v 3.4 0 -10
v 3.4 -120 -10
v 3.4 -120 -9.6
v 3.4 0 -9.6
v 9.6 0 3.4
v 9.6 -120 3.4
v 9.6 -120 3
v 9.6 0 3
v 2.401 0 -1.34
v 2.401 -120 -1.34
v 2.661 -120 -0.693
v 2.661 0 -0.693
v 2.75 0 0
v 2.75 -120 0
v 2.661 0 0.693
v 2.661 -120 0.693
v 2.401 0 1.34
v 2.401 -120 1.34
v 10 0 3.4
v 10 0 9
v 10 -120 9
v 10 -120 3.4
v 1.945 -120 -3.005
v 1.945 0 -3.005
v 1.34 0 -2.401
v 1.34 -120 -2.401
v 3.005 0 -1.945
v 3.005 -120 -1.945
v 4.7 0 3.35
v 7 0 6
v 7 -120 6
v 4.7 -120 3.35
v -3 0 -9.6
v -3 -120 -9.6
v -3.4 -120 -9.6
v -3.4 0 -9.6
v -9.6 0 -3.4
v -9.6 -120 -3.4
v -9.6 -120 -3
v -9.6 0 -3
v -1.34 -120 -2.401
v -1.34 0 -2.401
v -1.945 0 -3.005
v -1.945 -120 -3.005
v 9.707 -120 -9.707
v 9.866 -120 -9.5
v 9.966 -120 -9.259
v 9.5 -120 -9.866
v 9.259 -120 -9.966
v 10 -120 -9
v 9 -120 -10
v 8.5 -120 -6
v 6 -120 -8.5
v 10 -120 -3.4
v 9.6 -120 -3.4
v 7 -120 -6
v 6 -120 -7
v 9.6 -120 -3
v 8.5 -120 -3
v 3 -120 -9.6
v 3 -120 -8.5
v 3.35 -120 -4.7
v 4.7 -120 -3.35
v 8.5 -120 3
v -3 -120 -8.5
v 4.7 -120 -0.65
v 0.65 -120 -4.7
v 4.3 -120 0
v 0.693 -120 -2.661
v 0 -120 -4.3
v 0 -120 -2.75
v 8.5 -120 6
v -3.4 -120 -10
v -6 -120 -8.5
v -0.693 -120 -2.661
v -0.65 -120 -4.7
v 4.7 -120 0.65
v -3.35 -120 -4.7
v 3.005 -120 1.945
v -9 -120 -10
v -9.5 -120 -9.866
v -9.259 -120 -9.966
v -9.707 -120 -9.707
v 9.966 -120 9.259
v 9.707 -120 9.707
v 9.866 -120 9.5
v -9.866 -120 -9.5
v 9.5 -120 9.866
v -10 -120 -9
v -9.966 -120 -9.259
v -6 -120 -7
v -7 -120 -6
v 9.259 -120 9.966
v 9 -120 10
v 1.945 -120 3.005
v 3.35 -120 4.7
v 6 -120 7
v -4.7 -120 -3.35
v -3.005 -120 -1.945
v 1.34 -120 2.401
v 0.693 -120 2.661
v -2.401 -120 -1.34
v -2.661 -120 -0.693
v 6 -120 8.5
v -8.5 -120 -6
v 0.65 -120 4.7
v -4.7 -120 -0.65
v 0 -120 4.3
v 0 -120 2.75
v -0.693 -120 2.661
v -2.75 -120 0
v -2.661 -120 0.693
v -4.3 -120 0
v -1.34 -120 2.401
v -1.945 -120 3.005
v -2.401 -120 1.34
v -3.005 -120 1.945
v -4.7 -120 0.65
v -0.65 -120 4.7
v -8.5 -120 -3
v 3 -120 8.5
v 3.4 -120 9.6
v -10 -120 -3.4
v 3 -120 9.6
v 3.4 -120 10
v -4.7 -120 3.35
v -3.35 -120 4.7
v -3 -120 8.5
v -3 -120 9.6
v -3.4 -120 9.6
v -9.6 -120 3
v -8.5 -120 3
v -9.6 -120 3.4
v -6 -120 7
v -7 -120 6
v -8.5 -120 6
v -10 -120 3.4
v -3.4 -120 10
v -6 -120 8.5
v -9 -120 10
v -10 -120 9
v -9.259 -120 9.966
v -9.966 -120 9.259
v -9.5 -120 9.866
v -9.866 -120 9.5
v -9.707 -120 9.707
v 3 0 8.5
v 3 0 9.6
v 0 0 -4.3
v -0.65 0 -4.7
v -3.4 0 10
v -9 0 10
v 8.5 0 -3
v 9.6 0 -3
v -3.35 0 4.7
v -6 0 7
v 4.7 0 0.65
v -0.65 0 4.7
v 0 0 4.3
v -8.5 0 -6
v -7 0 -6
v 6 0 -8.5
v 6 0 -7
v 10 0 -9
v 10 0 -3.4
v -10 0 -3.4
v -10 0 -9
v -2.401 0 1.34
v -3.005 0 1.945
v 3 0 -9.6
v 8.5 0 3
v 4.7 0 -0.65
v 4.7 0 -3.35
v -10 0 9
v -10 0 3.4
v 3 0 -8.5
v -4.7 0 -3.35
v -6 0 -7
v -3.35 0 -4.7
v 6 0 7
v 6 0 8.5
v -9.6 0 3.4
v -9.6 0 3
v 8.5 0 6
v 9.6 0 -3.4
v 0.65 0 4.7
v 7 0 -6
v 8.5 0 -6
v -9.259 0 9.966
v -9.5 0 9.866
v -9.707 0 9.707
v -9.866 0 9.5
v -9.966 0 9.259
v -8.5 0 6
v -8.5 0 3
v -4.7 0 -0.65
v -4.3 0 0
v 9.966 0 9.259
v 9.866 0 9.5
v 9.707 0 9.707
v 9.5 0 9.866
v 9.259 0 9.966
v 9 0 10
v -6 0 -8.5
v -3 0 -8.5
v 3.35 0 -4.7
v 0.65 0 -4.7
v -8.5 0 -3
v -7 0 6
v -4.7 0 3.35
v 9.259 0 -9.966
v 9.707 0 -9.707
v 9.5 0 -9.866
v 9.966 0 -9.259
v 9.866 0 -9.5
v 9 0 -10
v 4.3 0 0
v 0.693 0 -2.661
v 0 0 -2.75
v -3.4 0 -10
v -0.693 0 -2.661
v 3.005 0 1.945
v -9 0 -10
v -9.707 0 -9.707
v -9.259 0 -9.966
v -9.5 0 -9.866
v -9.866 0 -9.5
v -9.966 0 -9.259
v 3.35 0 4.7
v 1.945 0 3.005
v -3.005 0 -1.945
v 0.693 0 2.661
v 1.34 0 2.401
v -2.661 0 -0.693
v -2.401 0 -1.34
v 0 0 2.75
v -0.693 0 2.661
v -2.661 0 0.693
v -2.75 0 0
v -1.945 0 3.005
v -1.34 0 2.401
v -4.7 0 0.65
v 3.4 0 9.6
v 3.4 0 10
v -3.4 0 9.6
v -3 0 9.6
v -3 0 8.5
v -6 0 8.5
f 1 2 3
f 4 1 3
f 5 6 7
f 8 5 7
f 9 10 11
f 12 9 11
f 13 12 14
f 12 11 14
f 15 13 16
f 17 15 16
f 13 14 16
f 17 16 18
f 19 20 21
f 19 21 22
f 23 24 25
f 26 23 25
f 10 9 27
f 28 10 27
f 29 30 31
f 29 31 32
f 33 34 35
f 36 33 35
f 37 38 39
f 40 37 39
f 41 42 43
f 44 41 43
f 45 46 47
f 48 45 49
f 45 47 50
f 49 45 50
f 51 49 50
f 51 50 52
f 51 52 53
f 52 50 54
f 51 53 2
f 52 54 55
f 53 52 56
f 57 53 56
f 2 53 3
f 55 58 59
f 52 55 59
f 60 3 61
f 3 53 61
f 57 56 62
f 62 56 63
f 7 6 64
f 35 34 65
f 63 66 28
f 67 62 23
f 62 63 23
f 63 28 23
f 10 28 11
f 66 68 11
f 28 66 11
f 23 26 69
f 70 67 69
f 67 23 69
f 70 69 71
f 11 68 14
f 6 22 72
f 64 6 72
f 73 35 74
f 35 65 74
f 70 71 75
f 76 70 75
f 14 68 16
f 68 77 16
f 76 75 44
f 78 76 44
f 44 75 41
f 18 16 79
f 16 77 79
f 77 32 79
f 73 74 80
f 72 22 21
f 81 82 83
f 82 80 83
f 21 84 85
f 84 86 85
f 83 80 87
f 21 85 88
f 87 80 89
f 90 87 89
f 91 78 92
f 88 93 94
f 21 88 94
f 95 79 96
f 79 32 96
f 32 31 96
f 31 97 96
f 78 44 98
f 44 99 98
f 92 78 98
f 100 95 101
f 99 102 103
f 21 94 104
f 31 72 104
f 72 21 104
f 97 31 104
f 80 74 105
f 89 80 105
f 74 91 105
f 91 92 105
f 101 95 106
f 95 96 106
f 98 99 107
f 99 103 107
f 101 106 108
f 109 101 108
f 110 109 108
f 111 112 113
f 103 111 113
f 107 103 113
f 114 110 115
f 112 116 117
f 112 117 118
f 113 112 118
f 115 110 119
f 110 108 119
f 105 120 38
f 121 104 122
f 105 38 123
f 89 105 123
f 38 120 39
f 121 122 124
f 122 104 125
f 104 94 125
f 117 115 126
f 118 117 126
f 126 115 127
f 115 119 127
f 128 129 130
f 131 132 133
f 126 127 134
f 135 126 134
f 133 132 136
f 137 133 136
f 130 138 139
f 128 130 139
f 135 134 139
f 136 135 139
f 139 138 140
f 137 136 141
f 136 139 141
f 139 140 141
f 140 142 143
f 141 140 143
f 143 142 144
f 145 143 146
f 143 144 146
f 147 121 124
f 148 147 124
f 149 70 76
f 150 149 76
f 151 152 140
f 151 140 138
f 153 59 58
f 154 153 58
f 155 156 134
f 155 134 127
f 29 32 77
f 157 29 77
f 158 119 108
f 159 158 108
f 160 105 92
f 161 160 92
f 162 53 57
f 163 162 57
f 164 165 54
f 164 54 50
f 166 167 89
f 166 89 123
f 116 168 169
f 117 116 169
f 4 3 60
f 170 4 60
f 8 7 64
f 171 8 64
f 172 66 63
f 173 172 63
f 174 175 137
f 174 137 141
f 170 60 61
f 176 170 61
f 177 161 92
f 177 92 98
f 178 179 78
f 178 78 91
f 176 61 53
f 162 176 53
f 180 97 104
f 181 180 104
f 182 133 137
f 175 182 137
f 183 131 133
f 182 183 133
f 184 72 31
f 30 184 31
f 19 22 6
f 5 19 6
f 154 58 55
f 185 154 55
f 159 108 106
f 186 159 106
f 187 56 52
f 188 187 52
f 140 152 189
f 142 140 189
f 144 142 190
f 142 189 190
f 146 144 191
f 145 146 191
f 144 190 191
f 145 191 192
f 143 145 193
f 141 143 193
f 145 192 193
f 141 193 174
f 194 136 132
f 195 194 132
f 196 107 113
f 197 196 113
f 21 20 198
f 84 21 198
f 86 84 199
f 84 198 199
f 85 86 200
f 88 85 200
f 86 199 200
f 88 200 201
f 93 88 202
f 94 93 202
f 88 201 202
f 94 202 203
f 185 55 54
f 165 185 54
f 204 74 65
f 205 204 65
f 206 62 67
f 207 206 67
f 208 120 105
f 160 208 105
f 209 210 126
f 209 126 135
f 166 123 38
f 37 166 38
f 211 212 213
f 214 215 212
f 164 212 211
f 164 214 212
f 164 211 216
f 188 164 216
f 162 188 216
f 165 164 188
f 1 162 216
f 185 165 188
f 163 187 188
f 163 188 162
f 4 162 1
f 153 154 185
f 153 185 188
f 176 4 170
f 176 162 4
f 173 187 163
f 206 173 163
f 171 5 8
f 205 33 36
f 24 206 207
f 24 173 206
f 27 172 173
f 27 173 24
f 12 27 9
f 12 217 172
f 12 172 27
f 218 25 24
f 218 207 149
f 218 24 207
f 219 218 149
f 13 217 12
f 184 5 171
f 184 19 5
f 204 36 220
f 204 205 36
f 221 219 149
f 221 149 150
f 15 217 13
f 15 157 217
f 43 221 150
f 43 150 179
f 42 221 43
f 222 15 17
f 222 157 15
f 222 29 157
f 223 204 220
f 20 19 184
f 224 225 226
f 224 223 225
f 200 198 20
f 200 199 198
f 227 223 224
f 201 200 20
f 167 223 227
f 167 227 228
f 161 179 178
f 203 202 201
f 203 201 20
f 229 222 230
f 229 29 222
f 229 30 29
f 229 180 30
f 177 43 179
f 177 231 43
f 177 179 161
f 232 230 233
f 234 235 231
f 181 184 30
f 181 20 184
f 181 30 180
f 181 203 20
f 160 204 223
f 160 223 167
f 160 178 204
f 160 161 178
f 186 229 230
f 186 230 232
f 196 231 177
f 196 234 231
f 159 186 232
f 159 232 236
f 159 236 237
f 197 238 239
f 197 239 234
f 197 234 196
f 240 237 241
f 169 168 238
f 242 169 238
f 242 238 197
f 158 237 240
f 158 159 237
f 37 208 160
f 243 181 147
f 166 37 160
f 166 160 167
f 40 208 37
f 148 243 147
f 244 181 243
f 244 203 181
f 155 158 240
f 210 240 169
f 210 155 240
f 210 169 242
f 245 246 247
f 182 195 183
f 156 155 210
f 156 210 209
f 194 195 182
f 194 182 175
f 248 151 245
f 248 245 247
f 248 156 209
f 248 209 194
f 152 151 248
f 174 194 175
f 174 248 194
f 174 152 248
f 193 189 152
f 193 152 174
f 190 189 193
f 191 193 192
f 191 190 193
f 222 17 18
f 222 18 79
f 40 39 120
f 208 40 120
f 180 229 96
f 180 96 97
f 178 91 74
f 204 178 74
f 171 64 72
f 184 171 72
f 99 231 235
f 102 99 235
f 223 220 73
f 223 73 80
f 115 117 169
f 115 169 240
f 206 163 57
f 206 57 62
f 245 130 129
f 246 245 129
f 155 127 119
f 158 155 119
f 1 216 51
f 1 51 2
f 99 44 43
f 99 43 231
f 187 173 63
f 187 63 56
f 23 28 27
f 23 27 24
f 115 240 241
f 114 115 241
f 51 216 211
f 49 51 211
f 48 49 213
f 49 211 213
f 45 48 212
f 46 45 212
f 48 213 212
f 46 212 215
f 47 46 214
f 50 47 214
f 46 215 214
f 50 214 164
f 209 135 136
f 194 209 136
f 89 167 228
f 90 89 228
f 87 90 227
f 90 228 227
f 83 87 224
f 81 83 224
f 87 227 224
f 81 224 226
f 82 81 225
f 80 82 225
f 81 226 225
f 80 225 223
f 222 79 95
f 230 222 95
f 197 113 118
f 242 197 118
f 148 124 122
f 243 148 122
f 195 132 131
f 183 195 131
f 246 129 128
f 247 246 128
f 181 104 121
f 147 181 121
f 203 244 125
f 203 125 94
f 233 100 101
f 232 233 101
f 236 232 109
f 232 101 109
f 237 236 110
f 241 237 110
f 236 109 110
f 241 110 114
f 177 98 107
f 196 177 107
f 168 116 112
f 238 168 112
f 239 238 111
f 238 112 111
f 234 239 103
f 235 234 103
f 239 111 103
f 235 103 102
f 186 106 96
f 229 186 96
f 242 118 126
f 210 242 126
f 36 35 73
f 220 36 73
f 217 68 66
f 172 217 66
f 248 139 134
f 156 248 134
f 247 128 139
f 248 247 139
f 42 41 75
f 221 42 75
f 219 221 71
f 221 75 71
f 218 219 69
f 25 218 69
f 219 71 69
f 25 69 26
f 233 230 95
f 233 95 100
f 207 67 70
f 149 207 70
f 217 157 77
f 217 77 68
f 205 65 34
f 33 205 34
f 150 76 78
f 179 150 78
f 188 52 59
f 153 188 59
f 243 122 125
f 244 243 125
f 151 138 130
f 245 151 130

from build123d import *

# Parameters (mm, degrees)
PAD_DEPTH          = 120
POCKET_DEPTH       = 380
POLARPATTERN_COUNT = 4
POCKET001_DEPTH    = 380


with BuildPart() as part:
    # Sketch → Pad (new body)
    with BuildSketch(Plane.XZ):
        with BuildLine():
            Line((-9, 10), (9, 10))
            ThreePointArc((10, 9), (9.707107, 9.707107), (9, 10))
            Line((10, 9), (10, -9))
            ThreePointArc((9, -10), (9.707107, -9.707107), (10, -9))
            Line((9, -10), (-9, -10))
            ThreePointArc((-10, -9), (-9.707107, -9.707107), (-9, -10))
            Line((-10, -9), (-10, 9))
            ThreePointArc((-9, 10), (-9.707107, 9.707107), (-10, 9))
        make_face()
    extrude(amount=PAD_DEPTH)

    # Sketch001 (on Face10 of Pad) → Pocket (cut)
    with BuildSketch(Plane.XZ.offset(120)):
        Polygon((-3.4, 10), (-3.4, 9.6), (-3, 9.6), (-3, 8.5), (-6, 8.5), (-6, 7), (-3.35, 4.7), (-0.65, 4.7), (0, 4.3), (0.65, 4.7), (3.35, 4.7), (6, 7), (6, 8.5), (3, 8.5), (3, 9.6), (3.4, 9.6), (3.4, 10), align=None)
    pocket = extrude(amount=-POCKET_DEPTH, mode=Mode.SUBTRACT)

    # PolarPattern: Pocket ×4 about axis
    polarpattern_axis = Axis((0, -120, 0), (0, -1, 0))
    for i in range(1, POLARPATTERN_COUNT):
        add(pocket.rotate(polarpattern_axis, i * 360 / POLARPATTERN_COUNT), mode=Mode.SUBTRACT)

    # Sketch002 (on Face4 of PolarPattern) → Pocket001 (cut)
    with BuildSketch(Plane.XZ.offset(120)):
        with BuildLine():
            ThreePointArc((1.340499, 2.401159), (0, 2.75), (-1.340499, 2.401159))
            Line((-1.944544, 3.005204), (-1.340499, 2.401159))
            Line((-3.005204, 1.944544), (-1.944544, 3.005204))
            Line((-2.401159, 1.340499), (-3.005204, 1.944544))
            ThreePointArc((-2.401159, 1.340499), (-2.75, 0), (-2.401159, -1.340499))
            Line((-3.005204, -1.944544), (-2.401159, -1.340499))
            Line((-1.944544, -3.005204), (-3.005204, -1.944544))
            Line((-1.340499, -2.401159), (-1.944544, -3.005204))
            ThreePointArc((-1.340499, -2.401159), (0, -2.75), (1.340499, -2.401159))
            Line((1.944544, -3.005204), (1.340499, -2.401159))
            Line((3.005204, -1.944544), (1.944544, -3.005204))
            Line((2.401159, -1.340499), (3.005204, -1.944544))
            ThreePointArc((2.401159, -1.340499), (2.75, 0), (2.401159, 1.340499))
            Line((2.401159, 1.340499), (3.005204, 1.944544))
            Line((3.005204, 1.944544), (1.944544, 3.005204))
            Line((1.944544, 3.005204), (1.340499, 2.401159))
        make_face()
    extrude(amount=-POCKET001_DEPTH, mode=Mode.SUBTRACT)


solid = part.part
